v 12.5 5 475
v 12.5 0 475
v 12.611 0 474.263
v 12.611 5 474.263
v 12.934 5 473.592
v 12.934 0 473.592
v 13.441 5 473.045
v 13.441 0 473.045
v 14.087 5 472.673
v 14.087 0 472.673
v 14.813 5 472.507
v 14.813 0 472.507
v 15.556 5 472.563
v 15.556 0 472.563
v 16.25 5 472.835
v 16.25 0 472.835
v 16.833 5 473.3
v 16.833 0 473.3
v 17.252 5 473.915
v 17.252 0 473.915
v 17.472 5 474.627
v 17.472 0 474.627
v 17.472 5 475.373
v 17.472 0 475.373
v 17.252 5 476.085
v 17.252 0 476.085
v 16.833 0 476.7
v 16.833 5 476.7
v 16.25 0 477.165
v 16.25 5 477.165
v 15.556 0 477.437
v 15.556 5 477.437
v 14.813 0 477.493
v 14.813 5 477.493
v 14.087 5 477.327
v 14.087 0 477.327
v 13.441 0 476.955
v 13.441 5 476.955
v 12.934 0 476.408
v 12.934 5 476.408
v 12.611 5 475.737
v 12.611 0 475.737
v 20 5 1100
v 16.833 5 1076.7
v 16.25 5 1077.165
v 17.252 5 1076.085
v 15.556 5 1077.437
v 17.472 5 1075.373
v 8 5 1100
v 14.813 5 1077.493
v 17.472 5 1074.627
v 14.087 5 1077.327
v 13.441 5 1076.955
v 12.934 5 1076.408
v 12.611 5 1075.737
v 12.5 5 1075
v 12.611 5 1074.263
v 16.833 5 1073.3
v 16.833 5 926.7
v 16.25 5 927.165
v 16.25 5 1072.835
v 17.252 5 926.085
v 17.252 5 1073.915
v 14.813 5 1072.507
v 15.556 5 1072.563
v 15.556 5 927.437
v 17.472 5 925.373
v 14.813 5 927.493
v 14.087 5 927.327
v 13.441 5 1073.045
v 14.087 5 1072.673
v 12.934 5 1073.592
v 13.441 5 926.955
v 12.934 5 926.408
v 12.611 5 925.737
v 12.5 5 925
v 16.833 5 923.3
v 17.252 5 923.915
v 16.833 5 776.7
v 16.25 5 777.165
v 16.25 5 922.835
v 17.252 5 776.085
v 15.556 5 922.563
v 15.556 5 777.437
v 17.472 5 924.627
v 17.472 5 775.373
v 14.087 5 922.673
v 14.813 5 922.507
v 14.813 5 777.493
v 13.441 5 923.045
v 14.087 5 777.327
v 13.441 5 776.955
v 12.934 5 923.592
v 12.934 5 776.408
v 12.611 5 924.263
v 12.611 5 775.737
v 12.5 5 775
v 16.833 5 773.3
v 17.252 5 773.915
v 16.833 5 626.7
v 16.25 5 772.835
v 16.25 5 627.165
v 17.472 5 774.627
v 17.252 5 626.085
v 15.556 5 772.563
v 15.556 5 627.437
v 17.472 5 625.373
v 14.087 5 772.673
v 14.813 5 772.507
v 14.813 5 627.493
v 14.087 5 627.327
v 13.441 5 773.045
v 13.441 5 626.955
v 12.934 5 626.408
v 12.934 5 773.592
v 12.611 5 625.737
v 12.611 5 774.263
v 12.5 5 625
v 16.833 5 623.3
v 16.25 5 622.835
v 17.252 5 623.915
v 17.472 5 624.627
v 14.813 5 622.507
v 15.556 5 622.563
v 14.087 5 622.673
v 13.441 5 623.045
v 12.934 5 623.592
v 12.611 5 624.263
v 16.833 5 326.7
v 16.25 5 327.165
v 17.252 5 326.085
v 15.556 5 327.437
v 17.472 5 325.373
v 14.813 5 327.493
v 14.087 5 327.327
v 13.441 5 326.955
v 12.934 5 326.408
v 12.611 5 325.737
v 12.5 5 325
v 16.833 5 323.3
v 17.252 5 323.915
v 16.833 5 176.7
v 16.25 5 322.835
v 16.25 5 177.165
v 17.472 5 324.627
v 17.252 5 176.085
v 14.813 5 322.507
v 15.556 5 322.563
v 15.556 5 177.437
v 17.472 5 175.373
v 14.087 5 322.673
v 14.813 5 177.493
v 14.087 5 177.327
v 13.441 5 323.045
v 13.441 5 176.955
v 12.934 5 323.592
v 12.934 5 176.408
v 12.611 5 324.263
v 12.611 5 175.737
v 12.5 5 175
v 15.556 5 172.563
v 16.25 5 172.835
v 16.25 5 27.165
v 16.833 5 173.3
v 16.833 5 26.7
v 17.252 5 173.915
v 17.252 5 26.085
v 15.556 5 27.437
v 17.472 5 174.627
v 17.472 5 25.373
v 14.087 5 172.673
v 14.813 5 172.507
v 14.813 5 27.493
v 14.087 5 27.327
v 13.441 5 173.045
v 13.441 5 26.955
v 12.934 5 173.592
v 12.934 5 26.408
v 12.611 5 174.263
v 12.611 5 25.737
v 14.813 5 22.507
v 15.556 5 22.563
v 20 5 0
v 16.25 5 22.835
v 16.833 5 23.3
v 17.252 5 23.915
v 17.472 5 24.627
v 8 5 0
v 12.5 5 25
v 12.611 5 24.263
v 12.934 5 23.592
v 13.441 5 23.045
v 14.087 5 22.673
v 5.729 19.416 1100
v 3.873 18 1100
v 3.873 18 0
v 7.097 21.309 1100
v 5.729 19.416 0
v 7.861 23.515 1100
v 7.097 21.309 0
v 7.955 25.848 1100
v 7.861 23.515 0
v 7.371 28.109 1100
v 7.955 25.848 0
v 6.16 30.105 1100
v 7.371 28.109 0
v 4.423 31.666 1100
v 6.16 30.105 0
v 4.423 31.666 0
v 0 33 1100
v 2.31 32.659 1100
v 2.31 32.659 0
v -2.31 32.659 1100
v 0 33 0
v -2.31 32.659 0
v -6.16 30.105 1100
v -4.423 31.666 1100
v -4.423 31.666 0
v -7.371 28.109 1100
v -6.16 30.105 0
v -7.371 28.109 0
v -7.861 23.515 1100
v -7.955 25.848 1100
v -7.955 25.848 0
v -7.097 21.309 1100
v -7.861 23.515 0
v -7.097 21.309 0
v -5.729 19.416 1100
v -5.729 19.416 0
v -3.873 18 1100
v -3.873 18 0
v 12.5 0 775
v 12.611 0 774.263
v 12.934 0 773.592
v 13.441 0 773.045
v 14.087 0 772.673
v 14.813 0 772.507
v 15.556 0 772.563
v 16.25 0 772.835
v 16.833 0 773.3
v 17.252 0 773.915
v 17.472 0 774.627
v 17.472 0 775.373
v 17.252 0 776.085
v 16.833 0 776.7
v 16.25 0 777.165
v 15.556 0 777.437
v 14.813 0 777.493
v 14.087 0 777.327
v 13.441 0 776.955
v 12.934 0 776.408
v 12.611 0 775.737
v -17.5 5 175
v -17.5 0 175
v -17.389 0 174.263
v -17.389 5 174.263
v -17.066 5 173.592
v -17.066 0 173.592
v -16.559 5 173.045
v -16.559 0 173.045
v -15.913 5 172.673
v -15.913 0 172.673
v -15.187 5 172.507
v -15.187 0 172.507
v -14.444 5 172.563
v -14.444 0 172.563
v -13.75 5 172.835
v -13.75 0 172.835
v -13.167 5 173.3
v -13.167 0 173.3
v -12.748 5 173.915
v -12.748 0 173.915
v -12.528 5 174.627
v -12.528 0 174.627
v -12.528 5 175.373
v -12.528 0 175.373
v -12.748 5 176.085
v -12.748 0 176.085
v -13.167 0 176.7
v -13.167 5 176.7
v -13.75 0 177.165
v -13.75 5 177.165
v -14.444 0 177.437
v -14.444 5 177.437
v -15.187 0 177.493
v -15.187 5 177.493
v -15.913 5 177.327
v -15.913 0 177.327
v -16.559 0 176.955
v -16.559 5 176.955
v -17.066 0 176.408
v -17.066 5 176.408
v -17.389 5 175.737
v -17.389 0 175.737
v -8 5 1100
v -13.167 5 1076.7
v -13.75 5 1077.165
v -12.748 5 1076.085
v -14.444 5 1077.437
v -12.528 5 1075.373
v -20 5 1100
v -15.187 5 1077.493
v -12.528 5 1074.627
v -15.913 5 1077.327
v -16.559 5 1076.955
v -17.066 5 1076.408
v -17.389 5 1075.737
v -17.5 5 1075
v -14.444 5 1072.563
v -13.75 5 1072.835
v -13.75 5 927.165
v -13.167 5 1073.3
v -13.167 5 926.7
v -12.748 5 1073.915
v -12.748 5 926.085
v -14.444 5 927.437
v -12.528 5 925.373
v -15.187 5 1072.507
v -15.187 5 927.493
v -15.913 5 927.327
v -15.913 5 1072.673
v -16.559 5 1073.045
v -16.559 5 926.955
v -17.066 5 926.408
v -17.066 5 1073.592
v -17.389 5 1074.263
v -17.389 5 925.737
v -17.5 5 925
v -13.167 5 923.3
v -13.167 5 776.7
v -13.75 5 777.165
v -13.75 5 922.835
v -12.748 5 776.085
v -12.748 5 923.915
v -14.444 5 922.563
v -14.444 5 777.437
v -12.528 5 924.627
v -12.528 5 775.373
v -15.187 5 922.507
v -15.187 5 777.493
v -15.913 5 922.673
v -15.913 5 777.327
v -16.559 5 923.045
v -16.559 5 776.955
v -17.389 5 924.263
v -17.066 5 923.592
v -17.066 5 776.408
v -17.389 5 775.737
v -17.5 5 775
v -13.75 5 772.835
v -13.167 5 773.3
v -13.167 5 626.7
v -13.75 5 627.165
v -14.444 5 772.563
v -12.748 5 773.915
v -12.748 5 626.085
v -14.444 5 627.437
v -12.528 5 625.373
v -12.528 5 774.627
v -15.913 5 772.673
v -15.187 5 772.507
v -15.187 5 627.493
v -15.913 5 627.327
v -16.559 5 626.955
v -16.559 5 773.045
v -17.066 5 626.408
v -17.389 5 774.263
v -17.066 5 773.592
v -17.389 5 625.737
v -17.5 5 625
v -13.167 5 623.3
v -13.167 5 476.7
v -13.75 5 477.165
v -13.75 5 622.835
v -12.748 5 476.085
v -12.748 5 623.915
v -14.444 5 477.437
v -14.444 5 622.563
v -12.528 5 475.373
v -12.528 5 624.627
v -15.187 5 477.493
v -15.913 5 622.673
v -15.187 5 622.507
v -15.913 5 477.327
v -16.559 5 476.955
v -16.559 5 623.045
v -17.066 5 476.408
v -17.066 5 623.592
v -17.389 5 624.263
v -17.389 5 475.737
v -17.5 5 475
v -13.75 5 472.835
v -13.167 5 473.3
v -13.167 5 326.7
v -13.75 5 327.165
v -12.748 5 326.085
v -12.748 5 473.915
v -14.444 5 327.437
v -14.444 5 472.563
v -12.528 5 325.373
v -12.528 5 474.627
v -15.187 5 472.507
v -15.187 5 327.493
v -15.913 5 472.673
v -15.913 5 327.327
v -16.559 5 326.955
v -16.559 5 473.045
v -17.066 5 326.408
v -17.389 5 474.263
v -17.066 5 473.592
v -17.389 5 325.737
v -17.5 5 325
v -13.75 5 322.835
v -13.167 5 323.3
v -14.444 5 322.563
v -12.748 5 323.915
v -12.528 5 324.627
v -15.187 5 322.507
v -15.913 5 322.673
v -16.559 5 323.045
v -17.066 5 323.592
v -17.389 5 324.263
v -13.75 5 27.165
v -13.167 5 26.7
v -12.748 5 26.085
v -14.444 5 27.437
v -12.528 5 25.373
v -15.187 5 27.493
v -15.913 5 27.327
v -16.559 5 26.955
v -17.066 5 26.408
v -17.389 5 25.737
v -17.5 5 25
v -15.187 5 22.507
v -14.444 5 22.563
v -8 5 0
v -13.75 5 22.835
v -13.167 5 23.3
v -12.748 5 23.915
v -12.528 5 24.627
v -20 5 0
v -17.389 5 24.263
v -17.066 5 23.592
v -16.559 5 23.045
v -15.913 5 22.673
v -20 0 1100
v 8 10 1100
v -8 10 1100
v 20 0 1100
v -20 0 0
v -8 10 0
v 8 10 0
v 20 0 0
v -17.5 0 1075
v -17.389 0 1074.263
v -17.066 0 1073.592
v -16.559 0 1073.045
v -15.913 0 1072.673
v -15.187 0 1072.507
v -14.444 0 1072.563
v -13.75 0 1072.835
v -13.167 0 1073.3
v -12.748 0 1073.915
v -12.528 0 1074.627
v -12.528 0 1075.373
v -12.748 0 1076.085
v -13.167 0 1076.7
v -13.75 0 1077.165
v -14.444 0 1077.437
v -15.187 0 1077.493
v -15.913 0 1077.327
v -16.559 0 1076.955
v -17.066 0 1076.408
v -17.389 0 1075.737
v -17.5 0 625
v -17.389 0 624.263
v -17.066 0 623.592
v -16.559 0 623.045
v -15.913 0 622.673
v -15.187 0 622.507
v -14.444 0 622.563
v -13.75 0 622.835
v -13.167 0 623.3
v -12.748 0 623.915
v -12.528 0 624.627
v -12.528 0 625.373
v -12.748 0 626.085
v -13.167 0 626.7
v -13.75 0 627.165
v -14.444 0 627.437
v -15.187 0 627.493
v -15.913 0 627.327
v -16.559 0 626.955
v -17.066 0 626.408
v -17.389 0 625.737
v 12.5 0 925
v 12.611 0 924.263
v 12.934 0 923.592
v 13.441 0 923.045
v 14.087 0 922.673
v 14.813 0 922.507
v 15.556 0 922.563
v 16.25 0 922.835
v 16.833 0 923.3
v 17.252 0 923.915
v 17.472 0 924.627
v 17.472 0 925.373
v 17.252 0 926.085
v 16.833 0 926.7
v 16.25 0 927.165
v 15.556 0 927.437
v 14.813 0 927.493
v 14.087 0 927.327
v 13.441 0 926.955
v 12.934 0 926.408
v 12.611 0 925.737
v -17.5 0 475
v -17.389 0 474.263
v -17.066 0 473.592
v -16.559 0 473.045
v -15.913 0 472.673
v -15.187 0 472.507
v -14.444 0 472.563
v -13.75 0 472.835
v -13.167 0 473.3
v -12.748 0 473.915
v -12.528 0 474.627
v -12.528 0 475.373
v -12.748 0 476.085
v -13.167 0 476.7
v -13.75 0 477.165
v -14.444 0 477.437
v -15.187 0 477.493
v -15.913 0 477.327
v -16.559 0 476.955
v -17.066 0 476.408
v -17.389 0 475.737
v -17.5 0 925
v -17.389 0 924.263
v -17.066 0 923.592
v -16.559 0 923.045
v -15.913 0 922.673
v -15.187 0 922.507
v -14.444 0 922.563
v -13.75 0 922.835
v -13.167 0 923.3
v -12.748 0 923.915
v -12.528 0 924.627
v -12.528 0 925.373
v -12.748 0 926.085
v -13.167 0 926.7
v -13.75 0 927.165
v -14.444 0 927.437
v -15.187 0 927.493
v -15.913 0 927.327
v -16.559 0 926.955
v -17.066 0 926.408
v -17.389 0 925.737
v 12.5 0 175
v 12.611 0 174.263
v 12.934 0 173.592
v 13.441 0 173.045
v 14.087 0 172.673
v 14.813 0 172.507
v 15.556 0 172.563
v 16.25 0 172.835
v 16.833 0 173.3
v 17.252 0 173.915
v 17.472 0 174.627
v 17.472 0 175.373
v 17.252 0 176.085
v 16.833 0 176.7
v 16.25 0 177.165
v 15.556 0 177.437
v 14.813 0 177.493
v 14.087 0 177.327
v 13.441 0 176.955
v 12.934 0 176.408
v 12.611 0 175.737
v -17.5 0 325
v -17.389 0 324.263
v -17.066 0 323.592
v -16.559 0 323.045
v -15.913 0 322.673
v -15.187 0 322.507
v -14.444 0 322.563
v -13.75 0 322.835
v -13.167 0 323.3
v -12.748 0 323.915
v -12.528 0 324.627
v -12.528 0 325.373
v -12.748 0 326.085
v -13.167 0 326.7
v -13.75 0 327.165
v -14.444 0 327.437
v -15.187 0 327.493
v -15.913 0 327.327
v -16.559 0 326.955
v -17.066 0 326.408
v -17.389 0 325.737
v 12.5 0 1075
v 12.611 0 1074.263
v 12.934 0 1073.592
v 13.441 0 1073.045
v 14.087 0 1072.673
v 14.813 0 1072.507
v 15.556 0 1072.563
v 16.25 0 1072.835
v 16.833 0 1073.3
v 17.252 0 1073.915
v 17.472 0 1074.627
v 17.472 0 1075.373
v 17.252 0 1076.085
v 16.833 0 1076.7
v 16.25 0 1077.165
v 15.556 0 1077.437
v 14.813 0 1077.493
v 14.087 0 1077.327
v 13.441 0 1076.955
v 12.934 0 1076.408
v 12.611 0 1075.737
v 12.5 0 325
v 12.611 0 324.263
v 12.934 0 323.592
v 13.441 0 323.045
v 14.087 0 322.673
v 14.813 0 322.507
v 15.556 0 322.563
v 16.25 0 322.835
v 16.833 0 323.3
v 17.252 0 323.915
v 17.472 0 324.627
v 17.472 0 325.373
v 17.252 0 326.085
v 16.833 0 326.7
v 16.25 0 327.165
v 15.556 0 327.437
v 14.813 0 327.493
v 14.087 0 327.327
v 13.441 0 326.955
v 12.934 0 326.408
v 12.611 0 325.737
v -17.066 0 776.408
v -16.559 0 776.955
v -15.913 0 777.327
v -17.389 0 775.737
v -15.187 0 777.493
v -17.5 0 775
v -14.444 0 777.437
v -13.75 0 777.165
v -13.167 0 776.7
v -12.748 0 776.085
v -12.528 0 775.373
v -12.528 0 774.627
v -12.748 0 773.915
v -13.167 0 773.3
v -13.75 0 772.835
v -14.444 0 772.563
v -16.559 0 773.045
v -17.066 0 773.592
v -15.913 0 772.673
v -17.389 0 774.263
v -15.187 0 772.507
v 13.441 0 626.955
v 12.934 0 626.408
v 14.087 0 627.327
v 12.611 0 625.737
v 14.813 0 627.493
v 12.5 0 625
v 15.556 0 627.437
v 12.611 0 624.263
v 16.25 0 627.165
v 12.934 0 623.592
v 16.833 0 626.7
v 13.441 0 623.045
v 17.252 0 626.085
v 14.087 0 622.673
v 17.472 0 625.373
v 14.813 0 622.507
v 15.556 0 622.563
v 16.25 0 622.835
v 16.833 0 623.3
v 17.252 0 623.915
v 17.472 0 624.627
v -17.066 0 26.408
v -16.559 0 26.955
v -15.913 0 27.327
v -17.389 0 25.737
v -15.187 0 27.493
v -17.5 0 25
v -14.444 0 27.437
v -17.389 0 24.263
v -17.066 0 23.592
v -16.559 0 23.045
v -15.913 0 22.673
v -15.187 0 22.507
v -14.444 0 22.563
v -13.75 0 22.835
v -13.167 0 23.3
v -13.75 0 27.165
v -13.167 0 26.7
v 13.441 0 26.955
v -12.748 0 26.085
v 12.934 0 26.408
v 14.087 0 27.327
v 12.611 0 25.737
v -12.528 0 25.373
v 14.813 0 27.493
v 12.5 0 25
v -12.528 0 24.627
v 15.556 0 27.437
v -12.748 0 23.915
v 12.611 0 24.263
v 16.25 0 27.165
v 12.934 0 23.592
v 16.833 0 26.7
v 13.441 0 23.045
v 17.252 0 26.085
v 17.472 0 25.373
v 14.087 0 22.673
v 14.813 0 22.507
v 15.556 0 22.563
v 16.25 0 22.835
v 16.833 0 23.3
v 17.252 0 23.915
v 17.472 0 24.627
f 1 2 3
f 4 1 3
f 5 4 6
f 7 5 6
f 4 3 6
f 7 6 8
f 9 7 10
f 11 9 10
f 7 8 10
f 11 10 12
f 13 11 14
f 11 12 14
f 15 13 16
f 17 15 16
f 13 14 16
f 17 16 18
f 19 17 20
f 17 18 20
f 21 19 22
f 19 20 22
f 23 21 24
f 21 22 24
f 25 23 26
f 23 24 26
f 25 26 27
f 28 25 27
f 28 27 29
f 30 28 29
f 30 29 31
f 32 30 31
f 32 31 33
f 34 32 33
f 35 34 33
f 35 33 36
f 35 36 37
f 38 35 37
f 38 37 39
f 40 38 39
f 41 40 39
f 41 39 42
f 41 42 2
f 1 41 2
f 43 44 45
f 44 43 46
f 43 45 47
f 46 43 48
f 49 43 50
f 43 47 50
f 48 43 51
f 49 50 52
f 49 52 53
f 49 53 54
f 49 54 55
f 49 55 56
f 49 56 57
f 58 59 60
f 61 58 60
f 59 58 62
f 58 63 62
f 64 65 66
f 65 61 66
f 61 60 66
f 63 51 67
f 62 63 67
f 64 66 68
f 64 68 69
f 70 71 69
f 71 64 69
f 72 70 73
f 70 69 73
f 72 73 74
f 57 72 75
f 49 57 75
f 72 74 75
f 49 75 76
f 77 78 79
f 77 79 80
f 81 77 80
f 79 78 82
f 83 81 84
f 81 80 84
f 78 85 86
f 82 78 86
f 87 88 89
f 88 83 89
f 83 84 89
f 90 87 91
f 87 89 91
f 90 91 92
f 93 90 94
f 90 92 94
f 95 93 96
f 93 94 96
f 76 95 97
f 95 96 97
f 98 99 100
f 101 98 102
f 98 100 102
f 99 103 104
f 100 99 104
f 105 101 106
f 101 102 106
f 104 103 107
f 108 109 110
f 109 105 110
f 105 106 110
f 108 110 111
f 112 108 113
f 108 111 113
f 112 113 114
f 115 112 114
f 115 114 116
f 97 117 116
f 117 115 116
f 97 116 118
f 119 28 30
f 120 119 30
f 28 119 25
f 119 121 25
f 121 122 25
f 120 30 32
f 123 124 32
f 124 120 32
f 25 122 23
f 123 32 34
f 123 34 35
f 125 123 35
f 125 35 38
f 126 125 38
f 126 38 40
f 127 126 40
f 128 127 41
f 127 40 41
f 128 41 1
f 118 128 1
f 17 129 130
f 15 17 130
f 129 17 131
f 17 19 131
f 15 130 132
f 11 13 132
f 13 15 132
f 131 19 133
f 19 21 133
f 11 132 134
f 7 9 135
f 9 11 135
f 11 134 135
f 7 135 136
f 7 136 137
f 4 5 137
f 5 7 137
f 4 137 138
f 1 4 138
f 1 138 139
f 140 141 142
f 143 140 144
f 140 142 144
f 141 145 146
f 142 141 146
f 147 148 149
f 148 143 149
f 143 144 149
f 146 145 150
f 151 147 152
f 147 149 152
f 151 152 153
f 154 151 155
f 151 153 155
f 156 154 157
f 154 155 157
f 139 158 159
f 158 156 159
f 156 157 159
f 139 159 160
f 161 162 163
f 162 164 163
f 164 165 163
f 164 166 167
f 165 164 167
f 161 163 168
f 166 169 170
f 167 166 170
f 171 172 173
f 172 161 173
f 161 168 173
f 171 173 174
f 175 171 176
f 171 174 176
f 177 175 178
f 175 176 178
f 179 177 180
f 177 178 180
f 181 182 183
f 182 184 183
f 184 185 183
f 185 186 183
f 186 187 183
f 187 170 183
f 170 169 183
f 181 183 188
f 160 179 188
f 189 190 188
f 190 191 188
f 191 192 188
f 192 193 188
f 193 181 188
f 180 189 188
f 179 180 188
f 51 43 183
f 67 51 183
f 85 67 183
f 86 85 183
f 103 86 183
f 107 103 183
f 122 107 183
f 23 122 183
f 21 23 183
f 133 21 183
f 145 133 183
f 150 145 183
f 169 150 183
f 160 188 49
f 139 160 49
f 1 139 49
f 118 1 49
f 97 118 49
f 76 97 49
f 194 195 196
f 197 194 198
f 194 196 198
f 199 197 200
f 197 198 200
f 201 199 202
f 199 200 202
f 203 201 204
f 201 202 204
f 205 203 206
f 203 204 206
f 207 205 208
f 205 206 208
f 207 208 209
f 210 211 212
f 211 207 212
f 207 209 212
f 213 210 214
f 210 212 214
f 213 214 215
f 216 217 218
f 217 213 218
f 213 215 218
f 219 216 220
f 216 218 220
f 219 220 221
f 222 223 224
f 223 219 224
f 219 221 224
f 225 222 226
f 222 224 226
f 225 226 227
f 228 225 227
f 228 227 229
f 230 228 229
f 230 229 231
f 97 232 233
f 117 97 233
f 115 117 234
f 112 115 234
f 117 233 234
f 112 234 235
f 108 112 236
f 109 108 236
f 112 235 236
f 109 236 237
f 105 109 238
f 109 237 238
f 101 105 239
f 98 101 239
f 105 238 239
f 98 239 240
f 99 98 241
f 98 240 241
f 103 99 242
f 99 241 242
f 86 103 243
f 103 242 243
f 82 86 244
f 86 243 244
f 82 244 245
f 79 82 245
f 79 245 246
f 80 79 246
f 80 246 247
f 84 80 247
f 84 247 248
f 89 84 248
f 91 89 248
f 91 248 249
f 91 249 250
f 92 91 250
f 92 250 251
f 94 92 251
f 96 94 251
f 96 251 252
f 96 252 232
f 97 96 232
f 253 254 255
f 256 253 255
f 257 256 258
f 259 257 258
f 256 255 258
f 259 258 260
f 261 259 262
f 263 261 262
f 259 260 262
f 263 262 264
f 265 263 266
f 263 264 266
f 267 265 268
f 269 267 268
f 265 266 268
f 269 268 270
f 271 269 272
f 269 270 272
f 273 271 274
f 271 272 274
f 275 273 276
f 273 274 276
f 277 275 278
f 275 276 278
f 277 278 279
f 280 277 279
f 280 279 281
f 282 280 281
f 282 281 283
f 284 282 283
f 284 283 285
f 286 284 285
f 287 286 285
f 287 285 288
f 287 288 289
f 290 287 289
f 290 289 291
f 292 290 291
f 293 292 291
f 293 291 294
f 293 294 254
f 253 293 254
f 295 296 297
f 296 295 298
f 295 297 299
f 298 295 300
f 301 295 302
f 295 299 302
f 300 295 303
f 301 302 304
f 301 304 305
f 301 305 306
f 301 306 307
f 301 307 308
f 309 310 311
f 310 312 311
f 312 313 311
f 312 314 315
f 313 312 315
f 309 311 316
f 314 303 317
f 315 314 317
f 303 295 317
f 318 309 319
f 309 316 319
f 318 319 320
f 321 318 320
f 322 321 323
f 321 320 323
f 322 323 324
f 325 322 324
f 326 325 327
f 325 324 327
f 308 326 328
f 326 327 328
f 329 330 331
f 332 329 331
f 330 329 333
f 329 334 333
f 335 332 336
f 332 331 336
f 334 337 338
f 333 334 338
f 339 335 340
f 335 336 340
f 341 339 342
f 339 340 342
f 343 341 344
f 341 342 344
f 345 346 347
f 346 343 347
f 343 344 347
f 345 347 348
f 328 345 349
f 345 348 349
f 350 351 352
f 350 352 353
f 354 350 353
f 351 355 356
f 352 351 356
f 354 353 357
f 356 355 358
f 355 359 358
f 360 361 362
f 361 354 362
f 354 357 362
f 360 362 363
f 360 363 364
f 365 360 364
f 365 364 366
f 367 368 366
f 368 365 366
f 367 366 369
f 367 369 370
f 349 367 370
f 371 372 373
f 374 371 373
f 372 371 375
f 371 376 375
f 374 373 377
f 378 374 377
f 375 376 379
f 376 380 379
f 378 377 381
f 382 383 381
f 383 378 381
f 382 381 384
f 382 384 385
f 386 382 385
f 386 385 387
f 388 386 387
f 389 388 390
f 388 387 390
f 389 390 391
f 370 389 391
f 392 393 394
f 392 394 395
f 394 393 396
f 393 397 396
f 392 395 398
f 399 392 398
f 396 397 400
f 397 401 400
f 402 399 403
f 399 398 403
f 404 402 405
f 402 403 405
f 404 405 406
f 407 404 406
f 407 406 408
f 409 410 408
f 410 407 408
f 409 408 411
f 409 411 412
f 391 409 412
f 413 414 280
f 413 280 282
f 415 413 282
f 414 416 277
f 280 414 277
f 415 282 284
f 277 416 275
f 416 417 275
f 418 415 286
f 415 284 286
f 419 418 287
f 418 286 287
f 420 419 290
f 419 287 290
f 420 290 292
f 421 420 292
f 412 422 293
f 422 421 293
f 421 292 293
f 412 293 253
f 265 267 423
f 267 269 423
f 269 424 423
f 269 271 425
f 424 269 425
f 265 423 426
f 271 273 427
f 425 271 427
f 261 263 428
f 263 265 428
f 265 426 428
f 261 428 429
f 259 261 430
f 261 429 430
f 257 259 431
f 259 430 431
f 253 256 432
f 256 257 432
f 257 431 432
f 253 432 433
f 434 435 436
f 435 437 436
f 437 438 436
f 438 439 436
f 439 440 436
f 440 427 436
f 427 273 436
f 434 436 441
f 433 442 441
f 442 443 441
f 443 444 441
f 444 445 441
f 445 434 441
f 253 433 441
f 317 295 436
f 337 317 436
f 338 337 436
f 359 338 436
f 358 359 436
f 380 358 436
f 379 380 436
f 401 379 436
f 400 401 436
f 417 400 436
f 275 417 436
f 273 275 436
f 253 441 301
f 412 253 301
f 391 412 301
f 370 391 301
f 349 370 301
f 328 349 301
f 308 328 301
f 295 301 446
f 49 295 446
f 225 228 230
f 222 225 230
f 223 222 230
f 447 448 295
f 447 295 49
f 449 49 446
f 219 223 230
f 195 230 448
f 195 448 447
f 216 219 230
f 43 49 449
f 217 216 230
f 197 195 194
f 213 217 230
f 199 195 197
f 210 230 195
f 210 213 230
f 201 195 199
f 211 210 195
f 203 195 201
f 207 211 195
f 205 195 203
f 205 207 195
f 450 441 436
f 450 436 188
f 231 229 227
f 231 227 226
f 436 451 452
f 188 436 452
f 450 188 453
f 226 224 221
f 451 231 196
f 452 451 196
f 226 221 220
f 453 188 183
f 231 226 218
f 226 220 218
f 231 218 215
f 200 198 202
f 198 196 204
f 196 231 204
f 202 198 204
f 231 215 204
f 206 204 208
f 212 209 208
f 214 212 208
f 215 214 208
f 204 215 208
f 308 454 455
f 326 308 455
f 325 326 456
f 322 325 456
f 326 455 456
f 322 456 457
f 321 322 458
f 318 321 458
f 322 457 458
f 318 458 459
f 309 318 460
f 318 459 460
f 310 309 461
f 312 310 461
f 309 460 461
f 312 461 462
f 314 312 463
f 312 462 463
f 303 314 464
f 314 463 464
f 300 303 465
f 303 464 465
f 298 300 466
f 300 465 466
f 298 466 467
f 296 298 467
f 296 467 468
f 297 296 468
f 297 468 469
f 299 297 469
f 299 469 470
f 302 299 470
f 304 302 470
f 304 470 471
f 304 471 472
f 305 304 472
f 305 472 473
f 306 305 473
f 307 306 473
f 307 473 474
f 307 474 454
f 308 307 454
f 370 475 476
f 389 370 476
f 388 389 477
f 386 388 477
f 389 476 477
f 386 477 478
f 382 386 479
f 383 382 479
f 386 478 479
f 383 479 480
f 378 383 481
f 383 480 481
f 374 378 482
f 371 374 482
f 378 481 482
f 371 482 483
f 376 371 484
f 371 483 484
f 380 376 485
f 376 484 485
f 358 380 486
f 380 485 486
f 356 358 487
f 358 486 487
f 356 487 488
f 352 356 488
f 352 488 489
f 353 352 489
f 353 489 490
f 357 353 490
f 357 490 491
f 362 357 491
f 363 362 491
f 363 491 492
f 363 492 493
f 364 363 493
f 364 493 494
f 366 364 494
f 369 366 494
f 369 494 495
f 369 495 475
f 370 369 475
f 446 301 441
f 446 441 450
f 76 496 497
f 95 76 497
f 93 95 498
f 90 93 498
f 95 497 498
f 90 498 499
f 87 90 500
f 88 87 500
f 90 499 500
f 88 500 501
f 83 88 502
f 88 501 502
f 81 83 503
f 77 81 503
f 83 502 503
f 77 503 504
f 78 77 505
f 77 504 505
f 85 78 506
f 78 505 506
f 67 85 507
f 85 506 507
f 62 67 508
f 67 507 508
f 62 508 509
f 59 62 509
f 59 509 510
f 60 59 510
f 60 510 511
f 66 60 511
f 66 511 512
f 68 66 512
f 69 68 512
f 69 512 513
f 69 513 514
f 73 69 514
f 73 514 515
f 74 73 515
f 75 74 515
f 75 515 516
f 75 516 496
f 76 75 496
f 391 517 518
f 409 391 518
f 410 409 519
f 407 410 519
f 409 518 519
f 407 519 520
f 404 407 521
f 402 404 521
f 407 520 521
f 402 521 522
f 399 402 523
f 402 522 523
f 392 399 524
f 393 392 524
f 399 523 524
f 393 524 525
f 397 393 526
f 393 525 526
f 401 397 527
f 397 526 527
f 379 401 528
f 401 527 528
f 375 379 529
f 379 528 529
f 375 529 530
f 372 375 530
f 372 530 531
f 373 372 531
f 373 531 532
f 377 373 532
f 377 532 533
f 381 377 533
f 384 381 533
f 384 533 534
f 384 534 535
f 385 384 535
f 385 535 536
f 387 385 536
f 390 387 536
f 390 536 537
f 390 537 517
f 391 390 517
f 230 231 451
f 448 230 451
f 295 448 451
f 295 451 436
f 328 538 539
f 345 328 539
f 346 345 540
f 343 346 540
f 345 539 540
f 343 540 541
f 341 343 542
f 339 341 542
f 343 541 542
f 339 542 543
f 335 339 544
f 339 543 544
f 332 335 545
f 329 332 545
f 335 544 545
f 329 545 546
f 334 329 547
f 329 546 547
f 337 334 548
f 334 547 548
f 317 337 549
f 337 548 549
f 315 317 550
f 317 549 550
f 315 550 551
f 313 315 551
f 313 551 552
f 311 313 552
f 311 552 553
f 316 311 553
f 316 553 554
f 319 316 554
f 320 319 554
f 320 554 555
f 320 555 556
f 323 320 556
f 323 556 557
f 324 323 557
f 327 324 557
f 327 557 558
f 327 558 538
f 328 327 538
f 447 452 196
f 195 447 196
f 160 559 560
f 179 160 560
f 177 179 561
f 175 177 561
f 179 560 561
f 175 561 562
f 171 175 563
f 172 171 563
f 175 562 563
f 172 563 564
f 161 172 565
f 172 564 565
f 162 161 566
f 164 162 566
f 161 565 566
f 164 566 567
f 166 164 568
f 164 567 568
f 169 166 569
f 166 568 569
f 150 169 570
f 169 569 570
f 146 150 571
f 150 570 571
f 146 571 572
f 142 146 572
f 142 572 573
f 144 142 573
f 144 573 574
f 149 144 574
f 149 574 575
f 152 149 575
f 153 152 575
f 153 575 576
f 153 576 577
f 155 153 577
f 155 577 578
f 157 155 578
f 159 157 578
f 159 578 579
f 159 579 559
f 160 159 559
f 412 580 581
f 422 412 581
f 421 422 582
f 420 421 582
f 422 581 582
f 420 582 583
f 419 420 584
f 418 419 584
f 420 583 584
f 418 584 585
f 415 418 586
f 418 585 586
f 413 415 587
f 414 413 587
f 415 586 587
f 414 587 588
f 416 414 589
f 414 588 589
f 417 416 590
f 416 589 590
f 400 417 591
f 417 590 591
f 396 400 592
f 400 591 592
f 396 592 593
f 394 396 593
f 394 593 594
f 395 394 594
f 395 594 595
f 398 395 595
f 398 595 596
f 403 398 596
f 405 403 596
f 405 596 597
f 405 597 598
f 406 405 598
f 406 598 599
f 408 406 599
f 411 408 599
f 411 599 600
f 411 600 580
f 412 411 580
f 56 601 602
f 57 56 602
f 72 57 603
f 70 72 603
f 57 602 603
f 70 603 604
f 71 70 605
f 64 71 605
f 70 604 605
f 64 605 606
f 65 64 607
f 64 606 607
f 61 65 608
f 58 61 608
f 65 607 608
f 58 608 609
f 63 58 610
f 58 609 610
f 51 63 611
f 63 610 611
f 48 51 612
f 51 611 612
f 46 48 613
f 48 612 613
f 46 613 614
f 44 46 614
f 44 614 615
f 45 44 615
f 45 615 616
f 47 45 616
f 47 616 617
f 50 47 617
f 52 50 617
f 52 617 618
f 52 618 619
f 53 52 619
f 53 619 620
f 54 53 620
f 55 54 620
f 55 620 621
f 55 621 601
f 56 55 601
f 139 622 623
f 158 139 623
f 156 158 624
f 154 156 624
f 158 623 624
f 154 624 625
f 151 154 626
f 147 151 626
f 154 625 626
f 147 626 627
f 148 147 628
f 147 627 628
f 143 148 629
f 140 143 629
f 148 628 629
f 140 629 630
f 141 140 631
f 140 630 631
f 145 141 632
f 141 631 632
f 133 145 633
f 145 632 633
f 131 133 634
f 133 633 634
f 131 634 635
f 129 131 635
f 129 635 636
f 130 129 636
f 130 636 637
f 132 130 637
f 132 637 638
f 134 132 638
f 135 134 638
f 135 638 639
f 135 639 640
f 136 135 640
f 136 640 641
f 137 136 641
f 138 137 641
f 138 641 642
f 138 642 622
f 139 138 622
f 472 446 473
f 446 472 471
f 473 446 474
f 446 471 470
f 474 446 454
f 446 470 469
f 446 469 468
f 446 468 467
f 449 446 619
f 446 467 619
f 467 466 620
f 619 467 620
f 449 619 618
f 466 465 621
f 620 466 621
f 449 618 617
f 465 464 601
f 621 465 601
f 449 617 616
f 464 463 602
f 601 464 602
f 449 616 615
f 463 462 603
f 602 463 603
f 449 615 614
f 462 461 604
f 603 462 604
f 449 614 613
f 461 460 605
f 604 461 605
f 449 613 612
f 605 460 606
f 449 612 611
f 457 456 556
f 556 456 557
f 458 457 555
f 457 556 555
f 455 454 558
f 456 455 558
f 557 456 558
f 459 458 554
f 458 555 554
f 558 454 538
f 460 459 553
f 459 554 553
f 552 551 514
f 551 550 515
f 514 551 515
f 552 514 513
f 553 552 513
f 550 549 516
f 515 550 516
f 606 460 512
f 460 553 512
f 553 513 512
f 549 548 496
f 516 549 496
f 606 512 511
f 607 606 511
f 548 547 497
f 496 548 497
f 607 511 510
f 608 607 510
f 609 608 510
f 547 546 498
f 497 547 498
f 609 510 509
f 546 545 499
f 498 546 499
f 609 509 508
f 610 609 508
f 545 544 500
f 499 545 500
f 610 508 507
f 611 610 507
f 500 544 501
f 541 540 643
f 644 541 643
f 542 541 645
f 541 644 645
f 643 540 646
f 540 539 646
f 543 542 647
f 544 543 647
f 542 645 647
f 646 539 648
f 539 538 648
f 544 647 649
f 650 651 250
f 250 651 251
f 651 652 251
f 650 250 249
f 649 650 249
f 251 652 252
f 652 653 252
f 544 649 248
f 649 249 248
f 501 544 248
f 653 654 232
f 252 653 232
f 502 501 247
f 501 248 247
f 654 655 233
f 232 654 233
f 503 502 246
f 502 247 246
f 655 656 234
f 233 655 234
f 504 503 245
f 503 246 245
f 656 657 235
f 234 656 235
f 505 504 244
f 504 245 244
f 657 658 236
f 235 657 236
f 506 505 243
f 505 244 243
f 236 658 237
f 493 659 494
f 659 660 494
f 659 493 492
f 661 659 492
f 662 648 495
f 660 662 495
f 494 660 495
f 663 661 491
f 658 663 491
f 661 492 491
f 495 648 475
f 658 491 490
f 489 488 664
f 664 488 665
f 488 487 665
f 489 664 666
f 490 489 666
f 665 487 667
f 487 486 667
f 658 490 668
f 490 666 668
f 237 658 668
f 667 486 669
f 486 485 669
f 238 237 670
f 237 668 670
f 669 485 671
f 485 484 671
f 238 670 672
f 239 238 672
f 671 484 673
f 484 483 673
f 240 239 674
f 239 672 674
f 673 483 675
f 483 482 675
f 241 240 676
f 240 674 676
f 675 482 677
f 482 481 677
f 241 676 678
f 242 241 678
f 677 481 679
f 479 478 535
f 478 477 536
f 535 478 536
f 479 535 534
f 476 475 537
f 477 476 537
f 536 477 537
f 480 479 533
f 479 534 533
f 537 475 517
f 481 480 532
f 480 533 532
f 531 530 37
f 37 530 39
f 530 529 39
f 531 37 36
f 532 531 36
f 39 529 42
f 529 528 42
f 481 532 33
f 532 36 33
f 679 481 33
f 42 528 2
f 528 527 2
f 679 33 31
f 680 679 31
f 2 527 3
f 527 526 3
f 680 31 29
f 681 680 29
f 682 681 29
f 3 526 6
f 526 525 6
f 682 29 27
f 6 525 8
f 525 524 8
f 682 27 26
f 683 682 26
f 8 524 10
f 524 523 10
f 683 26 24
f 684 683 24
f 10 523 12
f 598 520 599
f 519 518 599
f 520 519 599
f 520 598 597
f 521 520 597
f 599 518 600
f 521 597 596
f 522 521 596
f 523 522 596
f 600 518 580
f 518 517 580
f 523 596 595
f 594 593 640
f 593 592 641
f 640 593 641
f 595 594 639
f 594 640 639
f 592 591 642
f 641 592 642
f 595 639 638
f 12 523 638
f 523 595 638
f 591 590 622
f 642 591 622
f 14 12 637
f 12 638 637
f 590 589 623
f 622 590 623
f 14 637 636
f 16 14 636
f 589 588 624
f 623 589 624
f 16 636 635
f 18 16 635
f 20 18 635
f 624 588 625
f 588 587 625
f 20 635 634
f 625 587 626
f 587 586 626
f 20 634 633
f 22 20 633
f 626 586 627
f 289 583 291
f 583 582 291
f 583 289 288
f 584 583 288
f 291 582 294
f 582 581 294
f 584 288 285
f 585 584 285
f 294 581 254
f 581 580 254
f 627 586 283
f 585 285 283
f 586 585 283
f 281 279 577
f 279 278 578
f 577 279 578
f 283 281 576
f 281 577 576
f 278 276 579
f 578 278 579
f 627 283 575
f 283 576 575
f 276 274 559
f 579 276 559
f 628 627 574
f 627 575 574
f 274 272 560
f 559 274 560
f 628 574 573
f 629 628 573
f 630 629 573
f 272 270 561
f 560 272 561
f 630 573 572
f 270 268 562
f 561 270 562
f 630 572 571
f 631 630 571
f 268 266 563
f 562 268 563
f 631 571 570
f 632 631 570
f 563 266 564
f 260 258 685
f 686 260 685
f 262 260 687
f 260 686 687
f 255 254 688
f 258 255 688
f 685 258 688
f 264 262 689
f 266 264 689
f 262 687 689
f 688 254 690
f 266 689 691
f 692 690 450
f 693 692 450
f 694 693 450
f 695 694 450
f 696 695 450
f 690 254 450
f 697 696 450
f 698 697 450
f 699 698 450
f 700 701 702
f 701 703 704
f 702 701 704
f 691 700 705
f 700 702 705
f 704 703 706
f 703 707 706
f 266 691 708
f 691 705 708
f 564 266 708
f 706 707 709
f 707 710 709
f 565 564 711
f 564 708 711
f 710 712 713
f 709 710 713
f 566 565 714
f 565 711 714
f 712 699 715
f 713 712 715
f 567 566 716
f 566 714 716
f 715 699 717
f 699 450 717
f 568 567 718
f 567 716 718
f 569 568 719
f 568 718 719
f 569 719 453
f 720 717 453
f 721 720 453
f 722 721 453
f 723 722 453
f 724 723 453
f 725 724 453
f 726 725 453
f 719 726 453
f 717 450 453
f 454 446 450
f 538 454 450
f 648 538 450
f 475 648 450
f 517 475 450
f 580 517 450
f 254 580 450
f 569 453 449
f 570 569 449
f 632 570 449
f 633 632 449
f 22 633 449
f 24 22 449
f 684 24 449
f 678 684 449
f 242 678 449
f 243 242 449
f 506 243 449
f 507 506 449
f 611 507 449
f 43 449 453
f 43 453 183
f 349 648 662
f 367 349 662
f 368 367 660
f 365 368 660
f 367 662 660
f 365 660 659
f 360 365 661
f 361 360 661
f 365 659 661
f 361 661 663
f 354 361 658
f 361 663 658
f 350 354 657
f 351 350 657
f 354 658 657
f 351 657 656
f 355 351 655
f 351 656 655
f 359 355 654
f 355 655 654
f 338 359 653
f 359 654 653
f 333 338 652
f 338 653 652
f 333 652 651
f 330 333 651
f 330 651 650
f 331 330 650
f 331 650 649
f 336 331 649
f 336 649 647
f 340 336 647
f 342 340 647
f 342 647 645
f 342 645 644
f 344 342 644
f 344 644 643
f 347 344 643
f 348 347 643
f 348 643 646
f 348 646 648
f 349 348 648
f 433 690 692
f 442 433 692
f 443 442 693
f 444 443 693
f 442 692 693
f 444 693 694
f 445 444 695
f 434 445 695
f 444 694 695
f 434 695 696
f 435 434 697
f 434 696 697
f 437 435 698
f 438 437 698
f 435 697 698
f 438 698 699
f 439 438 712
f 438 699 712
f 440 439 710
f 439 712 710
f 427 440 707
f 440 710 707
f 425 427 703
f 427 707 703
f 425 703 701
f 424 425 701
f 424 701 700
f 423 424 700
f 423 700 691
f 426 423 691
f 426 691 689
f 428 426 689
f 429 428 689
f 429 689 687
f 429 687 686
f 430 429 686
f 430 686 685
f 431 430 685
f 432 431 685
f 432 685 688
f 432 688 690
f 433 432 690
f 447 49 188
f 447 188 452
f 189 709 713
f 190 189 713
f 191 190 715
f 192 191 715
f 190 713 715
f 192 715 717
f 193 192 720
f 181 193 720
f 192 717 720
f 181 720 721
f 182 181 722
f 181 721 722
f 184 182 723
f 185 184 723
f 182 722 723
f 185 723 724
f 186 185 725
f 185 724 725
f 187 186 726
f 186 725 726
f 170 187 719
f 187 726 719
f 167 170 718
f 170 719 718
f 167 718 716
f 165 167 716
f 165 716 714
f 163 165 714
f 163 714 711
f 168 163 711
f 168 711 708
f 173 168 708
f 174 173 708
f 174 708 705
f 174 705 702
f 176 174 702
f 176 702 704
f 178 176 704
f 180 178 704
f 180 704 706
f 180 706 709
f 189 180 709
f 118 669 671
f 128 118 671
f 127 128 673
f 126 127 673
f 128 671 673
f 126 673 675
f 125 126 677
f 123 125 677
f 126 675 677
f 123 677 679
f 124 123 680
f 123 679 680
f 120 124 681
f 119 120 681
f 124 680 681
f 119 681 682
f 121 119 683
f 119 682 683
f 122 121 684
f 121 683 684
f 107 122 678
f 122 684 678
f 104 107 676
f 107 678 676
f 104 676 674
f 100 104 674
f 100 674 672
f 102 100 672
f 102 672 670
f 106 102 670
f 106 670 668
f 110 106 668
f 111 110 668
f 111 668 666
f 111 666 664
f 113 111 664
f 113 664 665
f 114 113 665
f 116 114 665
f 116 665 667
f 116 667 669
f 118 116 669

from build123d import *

# Parameters (mm, degrees)
BOSS_EXTRUDE3_DEPTH   = 1100
BOSS_EXTRUDE4_DEPTH   = 1100
F_5_0MM_DOWEL_HOLE1_D = 5
LPATTERN1_COUNT       = 8
LPATTERN1_PITCH       = 150


with BuildPart() as part:
    # Sketch2 → Boss-Extrude3 (new body)
    with BuildSketch(Plane.XY):
        with BuildLine():
            Line((-20, 5), (-20, 0))
            Line((-20, 0), (20, 0))
            Line((20, 0), (20, 5))
            Line((20, 5), (8, 5))
            Line((8, 5), (8, 10))
            Line((8, 10), (3.872983346, 18))
            ThreePointArc((3.872983346, 18), (0, 17), (-3.872983346, 18))
            Line((-3.872983346, 18), (-8, 10))
            Line((-8, 10), (-8, 5))
            Line((-8, 5), (-20, 5))
        make_face()
    extrude(amount=BOSS_EXTRUDE3_DEPTH)

    # Sketch2<4> → Boss-Extrude4 (add)
    with BuildSketch(Plane.XY):
        with BuildLine():
            ThreePointArc((8, 25), (-4.063012013, 31.891439137), (-3.872983346, 18))
            ThreePointArc((-3.872983346, 18), (0, 17), (3.872983346, 18))
            ThreePointArc((3.872983346, 18), (6.891439137, 20.936987987), (8, 25))
        make_face()
    extrude(amount=BOSS_EXTRUDE4_DEPTH)

    # Ø5.0mm Dowel Hole1 (through all)
    with Locations(Plane(origin=(0, 5, 0), x_dir=(1, 0, 0), z_dir=(0, 1, 0))):
        with Locations((15, -1075), (-15, -1075)):
            f_5_0mm_dowel_hole1 = Hole(F_5_0MM_DOWEL_HOLE1_D / 2)

    # LPattern1: Ø5.0mm Dowel Hole1 ×8
    with Locations(*[(0, 0, -i * LPATTERN1_PITCH) for i in range(1, LPATTERN1_COUNT)]):
        add(f_5_0mm_dowel_hole1, mode=Mode.SUBTRACT)


solid = part.part
